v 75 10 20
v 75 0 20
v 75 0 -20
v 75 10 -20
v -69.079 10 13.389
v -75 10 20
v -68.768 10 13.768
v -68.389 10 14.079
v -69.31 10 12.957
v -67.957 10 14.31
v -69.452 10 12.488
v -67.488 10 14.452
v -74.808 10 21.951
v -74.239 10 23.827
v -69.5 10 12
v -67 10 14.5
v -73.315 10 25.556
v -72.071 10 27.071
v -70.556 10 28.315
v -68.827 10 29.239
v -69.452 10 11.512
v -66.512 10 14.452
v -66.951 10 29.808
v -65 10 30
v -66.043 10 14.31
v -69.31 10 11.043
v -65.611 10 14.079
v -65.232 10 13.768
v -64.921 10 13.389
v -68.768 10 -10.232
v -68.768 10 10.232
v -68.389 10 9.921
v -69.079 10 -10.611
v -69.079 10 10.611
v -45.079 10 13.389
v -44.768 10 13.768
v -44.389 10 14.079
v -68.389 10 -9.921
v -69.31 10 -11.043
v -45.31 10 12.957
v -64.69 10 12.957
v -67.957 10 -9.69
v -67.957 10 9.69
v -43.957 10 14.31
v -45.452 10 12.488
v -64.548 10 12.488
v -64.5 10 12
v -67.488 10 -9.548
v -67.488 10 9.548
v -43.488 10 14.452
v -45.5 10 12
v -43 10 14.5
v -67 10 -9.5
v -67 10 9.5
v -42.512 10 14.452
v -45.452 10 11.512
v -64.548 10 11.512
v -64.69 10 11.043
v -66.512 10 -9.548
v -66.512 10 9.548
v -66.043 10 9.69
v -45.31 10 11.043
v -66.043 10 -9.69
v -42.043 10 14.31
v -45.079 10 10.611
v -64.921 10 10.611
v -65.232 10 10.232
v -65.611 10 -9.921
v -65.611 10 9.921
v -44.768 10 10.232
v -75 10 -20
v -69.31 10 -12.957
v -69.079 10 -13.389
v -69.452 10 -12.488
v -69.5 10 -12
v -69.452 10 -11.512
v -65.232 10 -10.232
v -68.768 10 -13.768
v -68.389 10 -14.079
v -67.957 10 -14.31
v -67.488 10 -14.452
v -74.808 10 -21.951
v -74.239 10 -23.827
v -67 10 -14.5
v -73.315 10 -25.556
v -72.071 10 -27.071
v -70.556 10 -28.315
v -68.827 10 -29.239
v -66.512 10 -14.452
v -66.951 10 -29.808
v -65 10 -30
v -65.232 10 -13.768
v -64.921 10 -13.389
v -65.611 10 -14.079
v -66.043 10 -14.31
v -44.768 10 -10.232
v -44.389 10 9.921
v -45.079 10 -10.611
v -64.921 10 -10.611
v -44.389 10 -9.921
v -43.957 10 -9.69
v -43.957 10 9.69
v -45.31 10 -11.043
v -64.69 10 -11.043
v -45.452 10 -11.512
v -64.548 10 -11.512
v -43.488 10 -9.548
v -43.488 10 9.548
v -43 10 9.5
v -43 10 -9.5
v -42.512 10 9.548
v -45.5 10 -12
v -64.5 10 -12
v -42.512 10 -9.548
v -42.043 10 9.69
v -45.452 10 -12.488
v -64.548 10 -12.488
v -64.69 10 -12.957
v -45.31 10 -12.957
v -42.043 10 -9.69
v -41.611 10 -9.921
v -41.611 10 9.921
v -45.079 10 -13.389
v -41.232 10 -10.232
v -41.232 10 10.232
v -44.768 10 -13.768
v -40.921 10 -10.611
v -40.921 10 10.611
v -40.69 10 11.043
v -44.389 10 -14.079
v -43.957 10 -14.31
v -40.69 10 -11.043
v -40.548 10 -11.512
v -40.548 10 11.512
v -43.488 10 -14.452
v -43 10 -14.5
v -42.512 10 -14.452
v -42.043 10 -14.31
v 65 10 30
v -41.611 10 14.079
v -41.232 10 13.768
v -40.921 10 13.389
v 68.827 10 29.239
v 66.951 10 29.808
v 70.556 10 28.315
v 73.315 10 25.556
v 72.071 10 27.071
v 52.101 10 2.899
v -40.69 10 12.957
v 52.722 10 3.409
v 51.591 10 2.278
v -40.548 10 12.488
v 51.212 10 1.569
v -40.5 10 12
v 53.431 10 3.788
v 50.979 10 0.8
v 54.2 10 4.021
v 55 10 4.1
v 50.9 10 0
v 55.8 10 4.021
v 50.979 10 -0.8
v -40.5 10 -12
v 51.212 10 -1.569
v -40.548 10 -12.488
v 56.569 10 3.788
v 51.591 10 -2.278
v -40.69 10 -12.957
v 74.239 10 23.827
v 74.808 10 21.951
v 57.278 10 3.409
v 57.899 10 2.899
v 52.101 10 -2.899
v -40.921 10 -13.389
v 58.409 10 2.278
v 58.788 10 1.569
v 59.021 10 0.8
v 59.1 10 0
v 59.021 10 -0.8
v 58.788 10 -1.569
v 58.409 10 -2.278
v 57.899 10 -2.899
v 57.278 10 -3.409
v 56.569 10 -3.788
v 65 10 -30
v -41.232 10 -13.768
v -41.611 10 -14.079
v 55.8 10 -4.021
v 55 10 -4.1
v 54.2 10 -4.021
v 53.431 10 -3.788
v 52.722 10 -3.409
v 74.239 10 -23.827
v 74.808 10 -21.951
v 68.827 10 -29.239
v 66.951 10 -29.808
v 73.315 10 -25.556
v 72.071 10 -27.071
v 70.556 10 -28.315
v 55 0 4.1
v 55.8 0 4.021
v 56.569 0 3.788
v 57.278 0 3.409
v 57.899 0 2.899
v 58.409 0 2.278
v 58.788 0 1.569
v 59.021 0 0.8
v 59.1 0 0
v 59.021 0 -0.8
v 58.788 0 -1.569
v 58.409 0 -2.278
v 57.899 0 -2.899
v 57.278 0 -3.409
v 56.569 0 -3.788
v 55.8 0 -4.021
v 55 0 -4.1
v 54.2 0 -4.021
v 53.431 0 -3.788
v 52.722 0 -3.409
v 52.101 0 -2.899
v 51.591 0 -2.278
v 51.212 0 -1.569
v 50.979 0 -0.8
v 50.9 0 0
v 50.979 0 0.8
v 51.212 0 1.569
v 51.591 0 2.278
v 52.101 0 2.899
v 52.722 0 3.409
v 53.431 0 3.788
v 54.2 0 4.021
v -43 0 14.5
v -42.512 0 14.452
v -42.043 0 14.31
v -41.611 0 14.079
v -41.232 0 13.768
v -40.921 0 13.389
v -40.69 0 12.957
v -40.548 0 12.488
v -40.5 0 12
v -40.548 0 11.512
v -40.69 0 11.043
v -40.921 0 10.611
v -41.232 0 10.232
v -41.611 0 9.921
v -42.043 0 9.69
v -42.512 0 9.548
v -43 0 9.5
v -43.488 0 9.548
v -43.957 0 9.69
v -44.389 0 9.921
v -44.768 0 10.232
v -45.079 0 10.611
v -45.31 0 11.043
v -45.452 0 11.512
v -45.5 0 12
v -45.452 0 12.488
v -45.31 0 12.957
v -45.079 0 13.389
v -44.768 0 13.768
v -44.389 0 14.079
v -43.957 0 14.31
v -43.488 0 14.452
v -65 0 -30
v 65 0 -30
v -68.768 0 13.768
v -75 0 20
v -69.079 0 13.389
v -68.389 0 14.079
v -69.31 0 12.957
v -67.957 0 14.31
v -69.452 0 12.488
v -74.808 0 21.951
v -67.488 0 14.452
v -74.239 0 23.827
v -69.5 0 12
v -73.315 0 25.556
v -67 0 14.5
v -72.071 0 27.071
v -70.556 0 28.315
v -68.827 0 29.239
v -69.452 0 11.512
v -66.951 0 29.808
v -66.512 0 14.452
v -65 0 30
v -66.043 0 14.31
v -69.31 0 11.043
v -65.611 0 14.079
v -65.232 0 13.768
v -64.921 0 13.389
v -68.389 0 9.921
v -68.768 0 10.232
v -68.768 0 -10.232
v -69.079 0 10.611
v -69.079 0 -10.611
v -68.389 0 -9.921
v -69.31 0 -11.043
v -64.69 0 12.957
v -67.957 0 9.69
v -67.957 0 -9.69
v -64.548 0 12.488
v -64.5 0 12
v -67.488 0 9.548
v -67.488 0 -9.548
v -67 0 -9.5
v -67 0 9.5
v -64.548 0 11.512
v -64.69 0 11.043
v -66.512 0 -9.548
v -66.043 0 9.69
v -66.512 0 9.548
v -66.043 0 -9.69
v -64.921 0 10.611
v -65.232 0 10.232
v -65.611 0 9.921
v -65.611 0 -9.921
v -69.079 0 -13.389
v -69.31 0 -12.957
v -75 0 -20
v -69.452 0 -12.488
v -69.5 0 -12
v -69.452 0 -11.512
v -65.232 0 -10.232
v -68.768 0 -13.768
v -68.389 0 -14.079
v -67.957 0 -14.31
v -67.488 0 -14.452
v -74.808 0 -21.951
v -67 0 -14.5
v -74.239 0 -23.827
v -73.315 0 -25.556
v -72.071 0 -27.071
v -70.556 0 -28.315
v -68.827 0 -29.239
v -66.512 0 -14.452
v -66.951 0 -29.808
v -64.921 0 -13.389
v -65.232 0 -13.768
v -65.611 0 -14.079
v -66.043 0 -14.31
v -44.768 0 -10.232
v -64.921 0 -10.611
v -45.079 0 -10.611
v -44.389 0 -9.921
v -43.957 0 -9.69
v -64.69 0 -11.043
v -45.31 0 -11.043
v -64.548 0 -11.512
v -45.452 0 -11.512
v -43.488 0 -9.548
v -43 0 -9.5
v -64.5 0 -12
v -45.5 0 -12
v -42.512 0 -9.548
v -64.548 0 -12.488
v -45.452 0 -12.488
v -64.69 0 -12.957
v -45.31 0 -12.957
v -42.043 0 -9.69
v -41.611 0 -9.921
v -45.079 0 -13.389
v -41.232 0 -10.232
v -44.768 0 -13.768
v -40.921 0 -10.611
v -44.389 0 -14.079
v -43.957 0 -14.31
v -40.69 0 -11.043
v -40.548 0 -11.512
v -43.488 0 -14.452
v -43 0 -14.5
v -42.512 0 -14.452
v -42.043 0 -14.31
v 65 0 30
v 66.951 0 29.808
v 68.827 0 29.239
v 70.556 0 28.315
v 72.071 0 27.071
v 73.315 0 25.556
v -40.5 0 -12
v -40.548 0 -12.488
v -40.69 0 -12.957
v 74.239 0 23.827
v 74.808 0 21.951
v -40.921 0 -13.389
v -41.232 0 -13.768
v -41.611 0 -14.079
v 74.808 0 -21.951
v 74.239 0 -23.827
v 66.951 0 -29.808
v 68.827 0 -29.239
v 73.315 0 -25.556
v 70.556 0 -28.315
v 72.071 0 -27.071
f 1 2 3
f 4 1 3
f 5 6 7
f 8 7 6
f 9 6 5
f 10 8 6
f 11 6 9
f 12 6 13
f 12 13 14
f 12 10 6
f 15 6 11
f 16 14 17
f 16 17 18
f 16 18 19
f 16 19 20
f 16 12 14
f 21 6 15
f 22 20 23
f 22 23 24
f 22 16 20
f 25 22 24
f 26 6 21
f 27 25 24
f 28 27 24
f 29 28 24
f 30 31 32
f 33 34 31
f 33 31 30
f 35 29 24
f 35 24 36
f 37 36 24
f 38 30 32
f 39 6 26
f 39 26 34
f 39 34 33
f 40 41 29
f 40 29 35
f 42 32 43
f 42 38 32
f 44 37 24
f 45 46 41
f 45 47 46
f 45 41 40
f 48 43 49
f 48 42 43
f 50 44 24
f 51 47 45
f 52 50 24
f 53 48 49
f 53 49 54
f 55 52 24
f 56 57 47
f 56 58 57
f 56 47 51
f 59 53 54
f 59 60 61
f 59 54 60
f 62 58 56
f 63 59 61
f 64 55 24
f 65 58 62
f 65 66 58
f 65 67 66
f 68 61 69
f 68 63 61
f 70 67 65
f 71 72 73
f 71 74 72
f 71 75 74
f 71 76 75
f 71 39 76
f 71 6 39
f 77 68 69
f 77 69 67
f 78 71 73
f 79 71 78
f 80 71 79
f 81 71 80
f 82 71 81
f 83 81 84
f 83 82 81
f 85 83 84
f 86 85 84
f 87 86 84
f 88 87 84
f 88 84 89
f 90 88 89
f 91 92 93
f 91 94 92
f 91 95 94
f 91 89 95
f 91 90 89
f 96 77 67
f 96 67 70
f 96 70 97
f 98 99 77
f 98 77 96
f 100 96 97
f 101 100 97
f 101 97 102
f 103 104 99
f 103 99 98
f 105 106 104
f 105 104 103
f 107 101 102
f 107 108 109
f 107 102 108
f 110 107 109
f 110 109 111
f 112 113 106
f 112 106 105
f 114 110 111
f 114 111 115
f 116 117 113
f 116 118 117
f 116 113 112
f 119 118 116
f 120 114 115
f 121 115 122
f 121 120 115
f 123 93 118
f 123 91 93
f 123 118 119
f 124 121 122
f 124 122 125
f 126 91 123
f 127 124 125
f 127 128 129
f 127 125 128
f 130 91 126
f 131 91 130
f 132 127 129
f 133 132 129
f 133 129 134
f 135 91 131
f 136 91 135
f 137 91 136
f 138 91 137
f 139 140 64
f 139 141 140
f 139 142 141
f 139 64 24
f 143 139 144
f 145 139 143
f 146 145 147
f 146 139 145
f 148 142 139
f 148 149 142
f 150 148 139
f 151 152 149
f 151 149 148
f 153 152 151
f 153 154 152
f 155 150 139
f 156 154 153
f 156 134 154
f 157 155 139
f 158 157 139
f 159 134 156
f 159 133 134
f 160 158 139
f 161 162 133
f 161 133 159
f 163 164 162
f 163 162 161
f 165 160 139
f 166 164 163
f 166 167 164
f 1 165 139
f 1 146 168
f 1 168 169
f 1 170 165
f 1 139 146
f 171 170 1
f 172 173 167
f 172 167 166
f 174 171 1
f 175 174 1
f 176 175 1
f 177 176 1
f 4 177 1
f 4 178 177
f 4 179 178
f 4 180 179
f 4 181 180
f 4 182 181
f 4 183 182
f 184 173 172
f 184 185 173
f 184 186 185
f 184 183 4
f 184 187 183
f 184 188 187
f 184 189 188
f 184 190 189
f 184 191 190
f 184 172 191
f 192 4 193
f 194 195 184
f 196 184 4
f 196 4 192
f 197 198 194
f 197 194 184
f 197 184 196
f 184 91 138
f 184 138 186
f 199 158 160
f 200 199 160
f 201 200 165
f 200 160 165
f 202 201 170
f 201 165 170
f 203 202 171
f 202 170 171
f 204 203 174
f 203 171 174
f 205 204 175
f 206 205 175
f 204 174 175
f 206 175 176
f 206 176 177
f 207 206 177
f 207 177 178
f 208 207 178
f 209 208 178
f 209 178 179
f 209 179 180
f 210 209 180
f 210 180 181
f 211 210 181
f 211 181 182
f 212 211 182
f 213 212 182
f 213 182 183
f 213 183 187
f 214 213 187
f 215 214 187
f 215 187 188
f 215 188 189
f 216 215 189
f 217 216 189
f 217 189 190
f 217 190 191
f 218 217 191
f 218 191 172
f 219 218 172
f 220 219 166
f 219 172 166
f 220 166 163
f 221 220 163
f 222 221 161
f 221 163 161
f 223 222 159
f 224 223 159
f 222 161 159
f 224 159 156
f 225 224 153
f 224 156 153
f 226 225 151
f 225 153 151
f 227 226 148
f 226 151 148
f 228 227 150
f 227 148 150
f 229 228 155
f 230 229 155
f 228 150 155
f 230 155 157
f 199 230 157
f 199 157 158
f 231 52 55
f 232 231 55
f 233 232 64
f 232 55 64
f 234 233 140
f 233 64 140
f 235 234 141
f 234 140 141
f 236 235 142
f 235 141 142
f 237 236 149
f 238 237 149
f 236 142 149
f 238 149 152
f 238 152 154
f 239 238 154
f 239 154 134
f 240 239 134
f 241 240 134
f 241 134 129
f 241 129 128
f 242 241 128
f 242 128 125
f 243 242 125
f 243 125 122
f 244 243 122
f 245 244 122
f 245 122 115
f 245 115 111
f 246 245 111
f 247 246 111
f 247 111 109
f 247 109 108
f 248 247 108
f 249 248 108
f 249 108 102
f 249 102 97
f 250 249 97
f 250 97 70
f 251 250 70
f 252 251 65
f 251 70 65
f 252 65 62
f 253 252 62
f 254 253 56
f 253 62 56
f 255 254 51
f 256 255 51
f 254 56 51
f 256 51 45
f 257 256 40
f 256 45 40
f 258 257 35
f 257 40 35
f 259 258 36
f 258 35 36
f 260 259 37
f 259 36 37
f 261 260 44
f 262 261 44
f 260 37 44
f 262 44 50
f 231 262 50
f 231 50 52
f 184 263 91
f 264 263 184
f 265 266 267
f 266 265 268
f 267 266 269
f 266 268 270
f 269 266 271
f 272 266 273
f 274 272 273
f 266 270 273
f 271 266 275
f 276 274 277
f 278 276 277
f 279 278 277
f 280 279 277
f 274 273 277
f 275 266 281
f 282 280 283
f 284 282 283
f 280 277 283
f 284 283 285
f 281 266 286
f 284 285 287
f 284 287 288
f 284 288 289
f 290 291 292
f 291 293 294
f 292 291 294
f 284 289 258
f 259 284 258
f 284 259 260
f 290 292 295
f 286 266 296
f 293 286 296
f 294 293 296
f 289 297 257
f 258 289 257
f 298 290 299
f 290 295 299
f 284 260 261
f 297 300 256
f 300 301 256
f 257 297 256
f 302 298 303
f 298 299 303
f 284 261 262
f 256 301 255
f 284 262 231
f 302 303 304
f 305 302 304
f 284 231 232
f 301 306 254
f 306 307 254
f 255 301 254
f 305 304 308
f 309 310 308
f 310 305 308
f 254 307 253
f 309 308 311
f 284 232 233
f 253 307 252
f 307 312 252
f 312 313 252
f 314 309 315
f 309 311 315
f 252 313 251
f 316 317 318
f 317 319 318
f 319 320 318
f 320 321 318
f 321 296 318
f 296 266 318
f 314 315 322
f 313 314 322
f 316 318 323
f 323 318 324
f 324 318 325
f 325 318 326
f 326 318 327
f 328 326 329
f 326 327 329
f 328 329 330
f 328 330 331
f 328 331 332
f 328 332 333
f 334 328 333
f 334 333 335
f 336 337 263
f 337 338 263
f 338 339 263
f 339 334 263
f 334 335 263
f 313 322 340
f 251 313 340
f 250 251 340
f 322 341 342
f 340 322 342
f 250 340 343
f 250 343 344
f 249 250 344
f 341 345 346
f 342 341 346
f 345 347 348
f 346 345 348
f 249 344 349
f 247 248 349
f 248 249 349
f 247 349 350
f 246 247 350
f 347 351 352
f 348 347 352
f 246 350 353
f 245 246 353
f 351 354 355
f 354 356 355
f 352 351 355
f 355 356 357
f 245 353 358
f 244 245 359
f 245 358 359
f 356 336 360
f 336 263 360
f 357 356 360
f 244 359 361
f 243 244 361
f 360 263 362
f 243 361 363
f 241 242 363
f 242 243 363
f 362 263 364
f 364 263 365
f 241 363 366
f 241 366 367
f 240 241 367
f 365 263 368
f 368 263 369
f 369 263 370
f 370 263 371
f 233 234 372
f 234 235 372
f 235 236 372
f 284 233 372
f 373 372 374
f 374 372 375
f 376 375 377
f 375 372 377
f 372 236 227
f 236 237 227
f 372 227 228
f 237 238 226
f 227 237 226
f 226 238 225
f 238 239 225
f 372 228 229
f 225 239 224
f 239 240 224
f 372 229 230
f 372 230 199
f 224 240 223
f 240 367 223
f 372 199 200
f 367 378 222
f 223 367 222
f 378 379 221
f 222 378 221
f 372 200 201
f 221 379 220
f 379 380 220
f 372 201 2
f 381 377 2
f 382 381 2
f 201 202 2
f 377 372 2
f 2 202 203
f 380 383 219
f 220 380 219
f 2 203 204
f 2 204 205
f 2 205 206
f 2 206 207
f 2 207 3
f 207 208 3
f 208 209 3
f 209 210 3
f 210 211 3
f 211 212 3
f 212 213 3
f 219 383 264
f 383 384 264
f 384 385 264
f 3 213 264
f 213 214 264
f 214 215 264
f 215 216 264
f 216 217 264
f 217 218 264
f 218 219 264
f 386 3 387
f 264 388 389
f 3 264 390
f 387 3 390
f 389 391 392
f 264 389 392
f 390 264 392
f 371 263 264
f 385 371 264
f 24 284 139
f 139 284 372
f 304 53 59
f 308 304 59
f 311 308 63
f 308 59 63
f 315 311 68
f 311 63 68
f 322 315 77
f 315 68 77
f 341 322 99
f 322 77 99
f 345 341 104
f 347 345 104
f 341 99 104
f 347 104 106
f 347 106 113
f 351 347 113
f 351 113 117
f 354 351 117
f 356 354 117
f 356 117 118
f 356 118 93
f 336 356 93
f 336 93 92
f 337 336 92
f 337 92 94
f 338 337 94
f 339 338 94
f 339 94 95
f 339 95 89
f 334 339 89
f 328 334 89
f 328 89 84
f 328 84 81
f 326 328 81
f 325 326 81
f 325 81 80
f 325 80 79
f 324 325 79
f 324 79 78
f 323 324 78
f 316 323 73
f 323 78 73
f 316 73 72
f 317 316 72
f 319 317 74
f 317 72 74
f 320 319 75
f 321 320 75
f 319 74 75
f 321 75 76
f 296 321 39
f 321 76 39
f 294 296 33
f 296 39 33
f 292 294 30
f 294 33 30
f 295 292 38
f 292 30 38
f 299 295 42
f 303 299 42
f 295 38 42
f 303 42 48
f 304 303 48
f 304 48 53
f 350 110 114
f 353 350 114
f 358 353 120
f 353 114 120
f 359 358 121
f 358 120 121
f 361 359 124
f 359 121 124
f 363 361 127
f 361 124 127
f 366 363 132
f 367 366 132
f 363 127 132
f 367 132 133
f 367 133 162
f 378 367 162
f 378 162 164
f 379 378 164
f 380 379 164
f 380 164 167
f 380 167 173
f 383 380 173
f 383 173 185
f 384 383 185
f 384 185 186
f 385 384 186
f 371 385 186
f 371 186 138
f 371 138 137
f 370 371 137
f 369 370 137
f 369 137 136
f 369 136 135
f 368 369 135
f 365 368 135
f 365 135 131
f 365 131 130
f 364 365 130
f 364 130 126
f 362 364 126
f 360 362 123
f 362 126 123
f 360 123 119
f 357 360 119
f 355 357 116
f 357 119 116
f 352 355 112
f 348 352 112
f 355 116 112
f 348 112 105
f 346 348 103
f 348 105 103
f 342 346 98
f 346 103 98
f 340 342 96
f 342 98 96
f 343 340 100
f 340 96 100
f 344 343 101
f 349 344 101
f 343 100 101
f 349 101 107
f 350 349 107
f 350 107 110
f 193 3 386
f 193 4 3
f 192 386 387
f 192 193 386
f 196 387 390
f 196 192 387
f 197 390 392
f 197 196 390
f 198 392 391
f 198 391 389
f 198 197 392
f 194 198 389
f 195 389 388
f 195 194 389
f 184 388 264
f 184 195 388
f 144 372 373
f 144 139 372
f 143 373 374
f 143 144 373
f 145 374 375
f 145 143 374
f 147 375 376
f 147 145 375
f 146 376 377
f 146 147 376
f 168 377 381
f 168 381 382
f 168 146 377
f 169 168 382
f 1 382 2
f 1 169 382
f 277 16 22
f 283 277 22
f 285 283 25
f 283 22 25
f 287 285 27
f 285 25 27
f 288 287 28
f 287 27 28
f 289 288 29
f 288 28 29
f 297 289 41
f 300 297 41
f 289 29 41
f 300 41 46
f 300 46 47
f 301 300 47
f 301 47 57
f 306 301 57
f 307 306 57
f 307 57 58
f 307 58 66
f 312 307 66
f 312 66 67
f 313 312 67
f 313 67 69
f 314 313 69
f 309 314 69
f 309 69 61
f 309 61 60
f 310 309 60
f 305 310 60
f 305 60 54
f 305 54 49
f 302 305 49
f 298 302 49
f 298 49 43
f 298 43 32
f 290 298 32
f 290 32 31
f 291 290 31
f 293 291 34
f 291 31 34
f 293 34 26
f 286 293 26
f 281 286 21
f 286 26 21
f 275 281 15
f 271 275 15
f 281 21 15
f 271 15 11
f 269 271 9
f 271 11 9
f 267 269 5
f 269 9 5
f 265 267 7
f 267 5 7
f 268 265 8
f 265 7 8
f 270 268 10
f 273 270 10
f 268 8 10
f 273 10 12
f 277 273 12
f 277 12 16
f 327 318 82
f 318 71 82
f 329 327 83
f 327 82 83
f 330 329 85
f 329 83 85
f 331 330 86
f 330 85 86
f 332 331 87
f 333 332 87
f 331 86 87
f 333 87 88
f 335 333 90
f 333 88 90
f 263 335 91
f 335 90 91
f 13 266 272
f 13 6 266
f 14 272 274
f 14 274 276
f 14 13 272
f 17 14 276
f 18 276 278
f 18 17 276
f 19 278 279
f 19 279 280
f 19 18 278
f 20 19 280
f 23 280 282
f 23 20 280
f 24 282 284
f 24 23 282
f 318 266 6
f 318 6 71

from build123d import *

# Parameters (mm, degrees)
SKETCH_1_W          = 150
SKETCH_1_H          = 60
EXTRUDE_1_DEPTH     = 10
FILLET_1_R          = 10
SKETCH_2_R          = 2.5
SKETCH_2_R_2        = 4.1
CUT_EXTRUDE_1_DEPTH = 82.39410298


with BuildPart() as part:
    # ｽｹｯﾁ1 → ﾎﾞｽ - 押し出し1 (new body)
    with BuildSketch(Plane(origin=(0, 0, 0), x_dir=(1, 0, 0), z_dir=(0, 1, 0))):
        Rectangle(SKETCH_1_W, SKETCH_1_H)
    extrude(amount=EXTRUDE_1_DEPTH)

    # ﾌｨﾚｯﾄ1
    fillet_1_edges = [part.edges().sort_by_distance(p)[0] for p in [
        (75, 5, 30),
        (-75, 5, 30),
        (-75, 5, -30),
        (75, 5, -30),
    ]]
    fillet(fillet_1_edges, radius=FILLET_1_R)

    # ｽｹｯﾁ2 → ｶｯﾄ - 押し出し1 (cut, through all)
    with BuildSketch(Plane(origin=(0, 10, 0), x_dir=(1, 0, 0), z_dir=(0, 1, 0))):
        with Locations(Location((-67, 12, 0), (0, 0, 270))):
            Circle(SKETCH_2_R)
        with Locations(Location((-43, 12, 0), (0, 0, 270))):
            Circle(SKETCH_2_R)
        with Locations(Location((-67, -12, 0), (0, 0, 270))):
            Circle(SKETCH_2_R)
        with Locations(Location((-43, -12, 0), (0, 0, 270))):
            Circle(SKETCH_2_R)
        with Locations(Location((55, 0, 0), (0, 0, 270))):
            Circle(SKETCH_2_R_2)
    extrude(amount=-CUT_EXTRUDE_1_DEPTH, mode=Mode.SUBTRACT)


solid = part.part
